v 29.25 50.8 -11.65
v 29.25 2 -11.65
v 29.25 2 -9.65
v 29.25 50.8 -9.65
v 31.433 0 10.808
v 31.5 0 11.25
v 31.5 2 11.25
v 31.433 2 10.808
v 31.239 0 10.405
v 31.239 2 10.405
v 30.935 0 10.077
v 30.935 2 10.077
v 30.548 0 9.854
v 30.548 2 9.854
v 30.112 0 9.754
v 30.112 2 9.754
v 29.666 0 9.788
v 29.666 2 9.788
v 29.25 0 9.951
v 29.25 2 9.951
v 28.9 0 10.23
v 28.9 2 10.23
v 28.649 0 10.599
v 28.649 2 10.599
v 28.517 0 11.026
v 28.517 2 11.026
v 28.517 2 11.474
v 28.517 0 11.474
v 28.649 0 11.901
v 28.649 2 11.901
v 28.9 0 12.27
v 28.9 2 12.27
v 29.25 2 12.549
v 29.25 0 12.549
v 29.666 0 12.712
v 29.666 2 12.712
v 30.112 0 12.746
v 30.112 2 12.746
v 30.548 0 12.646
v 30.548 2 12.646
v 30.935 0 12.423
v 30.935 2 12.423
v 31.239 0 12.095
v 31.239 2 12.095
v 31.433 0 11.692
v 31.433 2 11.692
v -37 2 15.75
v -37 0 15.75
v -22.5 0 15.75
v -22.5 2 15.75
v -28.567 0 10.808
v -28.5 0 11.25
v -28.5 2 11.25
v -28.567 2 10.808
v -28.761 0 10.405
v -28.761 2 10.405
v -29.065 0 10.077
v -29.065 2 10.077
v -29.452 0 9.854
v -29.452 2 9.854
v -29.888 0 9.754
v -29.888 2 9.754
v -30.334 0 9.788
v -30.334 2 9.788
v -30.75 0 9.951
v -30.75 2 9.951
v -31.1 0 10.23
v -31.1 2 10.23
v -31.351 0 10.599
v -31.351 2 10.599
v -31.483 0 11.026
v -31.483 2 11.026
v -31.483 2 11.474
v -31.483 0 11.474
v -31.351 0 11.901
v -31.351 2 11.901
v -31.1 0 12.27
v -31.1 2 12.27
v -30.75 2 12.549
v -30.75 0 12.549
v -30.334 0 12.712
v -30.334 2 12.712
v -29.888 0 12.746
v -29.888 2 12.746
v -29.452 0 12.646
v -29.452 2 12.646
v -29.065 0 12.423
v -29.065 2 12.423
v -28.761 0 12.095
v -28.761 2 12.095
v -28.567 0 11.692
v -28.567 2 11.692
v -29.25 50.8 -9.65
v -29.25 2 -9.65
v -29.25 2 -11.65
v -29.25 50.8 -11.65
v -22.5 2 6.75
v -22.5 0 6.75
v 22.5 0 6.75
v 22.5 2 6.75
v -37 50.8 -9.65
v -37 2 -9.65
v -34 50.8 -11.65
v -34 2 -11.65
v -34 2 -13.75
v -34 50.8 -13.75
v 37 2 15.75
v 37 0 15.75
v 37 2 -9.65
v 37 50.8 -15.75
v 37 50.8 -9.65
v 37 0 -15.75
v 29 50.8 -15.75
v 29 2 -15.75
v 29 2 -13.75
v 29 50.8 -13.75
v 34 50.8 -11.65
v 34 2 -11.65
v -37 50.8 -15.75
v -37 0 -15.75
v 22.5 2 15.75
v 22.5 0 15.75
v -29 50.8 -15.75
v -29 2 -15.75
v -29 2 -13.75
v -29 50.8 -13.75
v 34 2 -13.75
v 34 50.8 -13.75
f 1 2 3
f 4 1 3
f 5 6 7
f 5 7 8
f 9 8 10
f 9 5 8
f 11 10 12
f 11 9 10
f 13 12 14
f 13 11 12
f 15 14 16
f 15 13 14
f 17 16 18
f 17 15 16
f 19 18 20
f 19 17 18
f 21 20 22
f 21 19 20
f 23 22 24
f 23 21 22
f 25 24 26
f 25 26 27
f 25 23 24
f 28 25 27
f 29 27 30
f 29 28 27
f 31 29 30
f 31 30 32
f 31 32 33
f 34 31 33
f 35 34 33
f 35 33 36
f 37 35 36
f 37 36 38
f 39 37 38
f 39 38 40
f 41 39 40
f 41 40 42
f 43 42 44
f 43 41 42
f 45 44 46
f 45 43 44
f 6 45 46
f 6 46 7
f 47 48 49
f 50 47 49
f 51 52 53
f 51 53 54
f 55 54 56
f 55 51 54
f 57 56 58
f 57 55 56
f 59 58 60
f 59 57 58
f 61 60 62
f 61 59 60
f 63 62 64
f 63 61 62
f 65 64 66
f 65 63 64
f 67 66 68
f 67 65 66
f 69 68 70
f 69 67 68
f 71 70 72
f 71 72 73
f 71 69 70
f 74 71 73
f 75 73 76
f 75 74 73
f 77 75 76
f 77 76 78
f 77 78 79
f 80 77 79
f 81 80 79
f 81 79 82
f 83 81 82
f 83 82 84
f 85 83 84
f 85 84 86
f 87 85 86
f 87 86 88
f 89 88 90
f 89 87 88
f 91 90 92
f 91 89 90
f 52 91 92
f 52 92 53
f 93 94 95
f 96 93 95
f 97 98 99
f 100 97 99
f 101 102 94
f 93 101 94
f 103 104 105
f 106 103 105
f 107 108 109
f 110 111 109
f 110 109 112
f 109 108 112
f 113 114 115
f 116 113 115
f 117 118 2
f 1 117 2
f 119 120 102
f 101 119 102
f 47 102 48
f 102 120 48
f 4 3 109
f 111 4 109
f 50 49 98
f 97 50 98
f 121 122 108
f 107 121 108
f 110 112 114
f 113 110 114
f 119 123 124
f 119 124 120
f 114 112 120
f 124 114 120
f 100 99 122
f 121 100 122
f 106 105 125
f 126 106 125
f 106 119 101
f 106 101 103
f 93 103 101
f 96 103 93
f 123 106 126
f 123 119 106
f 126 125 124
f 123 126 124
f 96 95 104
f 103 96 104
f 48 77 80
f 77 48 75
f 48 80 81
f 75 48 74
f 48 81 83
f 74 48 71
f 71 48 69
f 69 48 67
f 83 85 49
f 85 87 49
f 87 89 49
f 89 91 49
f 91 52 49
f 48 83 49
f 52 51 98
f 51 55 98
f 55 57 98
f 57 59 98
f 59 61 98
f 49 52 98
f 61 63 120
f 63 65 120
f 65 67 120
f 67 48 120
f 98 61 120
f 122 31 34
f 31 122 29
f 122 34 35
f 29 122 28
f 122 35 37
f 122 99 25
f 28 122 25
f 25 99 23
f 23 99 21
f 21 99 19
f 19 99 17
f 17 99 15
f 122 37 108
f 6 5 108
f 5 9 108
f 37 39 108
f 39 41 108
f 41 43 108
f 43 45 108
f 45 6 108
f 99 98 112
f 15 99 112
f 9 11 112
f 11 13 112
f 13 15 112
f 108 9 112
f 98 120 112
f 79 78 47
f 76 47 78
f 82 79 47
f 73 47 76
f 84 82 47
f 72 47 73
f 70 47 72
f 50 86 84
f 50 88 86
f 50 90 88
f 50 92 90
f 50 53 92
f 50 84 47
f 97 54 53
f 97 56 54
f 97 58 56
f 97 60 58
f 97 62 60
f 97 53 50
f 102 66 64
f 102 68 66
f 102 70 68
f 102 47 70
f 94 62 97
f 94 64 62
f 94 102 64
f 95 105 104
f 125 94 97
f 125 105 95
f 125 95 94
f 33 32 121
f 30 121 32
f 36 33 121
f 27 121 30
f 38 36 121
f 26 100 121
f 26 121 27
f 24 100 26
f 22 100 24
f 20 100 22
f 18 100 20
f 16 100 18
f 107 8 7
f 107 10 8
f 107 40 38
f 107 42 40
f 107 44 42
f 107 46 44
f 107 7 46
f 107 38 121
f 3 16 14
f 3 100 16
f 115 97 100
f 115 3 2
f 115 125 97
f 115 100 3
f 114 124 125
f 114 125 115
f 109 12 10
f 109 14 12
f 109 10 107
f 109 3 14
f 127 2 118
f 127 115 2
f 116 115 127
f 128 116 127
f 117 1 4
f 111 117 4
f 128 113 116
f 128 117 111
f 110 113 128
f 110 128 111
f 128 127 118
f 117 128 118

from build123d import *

# Parameters (mm, degrees)
SKETCH1_R           = 1.5
BOSS_EXTRUDE1_DEPTH = 2
BOSS_EXTRUDE2_DEPTH = 50.8


with BuildPart() as part:
    # Sketch1 → Boss-Extrude1 (new body)
    with BuildSketch(Plane(origin=(0, 0, 0), x_dir=(1, 0, 0), z_dir=(0, 1, 0))):
        Polygon((-37, 15.75), (-37, -15.75), (-22.5, -15.75), (-22.5, -6.75), (22.5, -6.75), (22.5, -15.75), (37, -15.75), (37, 15.75), align=None)
        with Locations((-30, -11.25)):
            Circle(SKETCH1_R, mode=Mode.SUBTRACT)
        with Locations((30, -11.25)):
            Circle(SKETCH1_R, mode=Mode.SUBTRACT)
    extrude(amount=BOSS_EXTRUDE1_DEPTH)

    # Sketch1<3> → Boss-Extrude2 (add)
    with BuildSketch(Plane(origin=(0, 0, 0), x_dir=(1, 0, 0), z_dir=(0, 1, 0))):
        Polygon((-29, 13.75), (-29, 15.75), (-37, 15.75), (-37, 9.65), (-29.25, 9.65), (-29.25, 11.65), (-34, 11.65), (-34, 13.75), align=None)
        Polygon((37, 15.75), (29, 15.75), (29, 13.75), (34, 13.75), (34, 11.65), (29.25, 11.65), (29.25, 9.65), (37, 9.65), align=None)
    extrude(amount=BOSS_EXTRUDE2_DEPTH)


solid = part.part
